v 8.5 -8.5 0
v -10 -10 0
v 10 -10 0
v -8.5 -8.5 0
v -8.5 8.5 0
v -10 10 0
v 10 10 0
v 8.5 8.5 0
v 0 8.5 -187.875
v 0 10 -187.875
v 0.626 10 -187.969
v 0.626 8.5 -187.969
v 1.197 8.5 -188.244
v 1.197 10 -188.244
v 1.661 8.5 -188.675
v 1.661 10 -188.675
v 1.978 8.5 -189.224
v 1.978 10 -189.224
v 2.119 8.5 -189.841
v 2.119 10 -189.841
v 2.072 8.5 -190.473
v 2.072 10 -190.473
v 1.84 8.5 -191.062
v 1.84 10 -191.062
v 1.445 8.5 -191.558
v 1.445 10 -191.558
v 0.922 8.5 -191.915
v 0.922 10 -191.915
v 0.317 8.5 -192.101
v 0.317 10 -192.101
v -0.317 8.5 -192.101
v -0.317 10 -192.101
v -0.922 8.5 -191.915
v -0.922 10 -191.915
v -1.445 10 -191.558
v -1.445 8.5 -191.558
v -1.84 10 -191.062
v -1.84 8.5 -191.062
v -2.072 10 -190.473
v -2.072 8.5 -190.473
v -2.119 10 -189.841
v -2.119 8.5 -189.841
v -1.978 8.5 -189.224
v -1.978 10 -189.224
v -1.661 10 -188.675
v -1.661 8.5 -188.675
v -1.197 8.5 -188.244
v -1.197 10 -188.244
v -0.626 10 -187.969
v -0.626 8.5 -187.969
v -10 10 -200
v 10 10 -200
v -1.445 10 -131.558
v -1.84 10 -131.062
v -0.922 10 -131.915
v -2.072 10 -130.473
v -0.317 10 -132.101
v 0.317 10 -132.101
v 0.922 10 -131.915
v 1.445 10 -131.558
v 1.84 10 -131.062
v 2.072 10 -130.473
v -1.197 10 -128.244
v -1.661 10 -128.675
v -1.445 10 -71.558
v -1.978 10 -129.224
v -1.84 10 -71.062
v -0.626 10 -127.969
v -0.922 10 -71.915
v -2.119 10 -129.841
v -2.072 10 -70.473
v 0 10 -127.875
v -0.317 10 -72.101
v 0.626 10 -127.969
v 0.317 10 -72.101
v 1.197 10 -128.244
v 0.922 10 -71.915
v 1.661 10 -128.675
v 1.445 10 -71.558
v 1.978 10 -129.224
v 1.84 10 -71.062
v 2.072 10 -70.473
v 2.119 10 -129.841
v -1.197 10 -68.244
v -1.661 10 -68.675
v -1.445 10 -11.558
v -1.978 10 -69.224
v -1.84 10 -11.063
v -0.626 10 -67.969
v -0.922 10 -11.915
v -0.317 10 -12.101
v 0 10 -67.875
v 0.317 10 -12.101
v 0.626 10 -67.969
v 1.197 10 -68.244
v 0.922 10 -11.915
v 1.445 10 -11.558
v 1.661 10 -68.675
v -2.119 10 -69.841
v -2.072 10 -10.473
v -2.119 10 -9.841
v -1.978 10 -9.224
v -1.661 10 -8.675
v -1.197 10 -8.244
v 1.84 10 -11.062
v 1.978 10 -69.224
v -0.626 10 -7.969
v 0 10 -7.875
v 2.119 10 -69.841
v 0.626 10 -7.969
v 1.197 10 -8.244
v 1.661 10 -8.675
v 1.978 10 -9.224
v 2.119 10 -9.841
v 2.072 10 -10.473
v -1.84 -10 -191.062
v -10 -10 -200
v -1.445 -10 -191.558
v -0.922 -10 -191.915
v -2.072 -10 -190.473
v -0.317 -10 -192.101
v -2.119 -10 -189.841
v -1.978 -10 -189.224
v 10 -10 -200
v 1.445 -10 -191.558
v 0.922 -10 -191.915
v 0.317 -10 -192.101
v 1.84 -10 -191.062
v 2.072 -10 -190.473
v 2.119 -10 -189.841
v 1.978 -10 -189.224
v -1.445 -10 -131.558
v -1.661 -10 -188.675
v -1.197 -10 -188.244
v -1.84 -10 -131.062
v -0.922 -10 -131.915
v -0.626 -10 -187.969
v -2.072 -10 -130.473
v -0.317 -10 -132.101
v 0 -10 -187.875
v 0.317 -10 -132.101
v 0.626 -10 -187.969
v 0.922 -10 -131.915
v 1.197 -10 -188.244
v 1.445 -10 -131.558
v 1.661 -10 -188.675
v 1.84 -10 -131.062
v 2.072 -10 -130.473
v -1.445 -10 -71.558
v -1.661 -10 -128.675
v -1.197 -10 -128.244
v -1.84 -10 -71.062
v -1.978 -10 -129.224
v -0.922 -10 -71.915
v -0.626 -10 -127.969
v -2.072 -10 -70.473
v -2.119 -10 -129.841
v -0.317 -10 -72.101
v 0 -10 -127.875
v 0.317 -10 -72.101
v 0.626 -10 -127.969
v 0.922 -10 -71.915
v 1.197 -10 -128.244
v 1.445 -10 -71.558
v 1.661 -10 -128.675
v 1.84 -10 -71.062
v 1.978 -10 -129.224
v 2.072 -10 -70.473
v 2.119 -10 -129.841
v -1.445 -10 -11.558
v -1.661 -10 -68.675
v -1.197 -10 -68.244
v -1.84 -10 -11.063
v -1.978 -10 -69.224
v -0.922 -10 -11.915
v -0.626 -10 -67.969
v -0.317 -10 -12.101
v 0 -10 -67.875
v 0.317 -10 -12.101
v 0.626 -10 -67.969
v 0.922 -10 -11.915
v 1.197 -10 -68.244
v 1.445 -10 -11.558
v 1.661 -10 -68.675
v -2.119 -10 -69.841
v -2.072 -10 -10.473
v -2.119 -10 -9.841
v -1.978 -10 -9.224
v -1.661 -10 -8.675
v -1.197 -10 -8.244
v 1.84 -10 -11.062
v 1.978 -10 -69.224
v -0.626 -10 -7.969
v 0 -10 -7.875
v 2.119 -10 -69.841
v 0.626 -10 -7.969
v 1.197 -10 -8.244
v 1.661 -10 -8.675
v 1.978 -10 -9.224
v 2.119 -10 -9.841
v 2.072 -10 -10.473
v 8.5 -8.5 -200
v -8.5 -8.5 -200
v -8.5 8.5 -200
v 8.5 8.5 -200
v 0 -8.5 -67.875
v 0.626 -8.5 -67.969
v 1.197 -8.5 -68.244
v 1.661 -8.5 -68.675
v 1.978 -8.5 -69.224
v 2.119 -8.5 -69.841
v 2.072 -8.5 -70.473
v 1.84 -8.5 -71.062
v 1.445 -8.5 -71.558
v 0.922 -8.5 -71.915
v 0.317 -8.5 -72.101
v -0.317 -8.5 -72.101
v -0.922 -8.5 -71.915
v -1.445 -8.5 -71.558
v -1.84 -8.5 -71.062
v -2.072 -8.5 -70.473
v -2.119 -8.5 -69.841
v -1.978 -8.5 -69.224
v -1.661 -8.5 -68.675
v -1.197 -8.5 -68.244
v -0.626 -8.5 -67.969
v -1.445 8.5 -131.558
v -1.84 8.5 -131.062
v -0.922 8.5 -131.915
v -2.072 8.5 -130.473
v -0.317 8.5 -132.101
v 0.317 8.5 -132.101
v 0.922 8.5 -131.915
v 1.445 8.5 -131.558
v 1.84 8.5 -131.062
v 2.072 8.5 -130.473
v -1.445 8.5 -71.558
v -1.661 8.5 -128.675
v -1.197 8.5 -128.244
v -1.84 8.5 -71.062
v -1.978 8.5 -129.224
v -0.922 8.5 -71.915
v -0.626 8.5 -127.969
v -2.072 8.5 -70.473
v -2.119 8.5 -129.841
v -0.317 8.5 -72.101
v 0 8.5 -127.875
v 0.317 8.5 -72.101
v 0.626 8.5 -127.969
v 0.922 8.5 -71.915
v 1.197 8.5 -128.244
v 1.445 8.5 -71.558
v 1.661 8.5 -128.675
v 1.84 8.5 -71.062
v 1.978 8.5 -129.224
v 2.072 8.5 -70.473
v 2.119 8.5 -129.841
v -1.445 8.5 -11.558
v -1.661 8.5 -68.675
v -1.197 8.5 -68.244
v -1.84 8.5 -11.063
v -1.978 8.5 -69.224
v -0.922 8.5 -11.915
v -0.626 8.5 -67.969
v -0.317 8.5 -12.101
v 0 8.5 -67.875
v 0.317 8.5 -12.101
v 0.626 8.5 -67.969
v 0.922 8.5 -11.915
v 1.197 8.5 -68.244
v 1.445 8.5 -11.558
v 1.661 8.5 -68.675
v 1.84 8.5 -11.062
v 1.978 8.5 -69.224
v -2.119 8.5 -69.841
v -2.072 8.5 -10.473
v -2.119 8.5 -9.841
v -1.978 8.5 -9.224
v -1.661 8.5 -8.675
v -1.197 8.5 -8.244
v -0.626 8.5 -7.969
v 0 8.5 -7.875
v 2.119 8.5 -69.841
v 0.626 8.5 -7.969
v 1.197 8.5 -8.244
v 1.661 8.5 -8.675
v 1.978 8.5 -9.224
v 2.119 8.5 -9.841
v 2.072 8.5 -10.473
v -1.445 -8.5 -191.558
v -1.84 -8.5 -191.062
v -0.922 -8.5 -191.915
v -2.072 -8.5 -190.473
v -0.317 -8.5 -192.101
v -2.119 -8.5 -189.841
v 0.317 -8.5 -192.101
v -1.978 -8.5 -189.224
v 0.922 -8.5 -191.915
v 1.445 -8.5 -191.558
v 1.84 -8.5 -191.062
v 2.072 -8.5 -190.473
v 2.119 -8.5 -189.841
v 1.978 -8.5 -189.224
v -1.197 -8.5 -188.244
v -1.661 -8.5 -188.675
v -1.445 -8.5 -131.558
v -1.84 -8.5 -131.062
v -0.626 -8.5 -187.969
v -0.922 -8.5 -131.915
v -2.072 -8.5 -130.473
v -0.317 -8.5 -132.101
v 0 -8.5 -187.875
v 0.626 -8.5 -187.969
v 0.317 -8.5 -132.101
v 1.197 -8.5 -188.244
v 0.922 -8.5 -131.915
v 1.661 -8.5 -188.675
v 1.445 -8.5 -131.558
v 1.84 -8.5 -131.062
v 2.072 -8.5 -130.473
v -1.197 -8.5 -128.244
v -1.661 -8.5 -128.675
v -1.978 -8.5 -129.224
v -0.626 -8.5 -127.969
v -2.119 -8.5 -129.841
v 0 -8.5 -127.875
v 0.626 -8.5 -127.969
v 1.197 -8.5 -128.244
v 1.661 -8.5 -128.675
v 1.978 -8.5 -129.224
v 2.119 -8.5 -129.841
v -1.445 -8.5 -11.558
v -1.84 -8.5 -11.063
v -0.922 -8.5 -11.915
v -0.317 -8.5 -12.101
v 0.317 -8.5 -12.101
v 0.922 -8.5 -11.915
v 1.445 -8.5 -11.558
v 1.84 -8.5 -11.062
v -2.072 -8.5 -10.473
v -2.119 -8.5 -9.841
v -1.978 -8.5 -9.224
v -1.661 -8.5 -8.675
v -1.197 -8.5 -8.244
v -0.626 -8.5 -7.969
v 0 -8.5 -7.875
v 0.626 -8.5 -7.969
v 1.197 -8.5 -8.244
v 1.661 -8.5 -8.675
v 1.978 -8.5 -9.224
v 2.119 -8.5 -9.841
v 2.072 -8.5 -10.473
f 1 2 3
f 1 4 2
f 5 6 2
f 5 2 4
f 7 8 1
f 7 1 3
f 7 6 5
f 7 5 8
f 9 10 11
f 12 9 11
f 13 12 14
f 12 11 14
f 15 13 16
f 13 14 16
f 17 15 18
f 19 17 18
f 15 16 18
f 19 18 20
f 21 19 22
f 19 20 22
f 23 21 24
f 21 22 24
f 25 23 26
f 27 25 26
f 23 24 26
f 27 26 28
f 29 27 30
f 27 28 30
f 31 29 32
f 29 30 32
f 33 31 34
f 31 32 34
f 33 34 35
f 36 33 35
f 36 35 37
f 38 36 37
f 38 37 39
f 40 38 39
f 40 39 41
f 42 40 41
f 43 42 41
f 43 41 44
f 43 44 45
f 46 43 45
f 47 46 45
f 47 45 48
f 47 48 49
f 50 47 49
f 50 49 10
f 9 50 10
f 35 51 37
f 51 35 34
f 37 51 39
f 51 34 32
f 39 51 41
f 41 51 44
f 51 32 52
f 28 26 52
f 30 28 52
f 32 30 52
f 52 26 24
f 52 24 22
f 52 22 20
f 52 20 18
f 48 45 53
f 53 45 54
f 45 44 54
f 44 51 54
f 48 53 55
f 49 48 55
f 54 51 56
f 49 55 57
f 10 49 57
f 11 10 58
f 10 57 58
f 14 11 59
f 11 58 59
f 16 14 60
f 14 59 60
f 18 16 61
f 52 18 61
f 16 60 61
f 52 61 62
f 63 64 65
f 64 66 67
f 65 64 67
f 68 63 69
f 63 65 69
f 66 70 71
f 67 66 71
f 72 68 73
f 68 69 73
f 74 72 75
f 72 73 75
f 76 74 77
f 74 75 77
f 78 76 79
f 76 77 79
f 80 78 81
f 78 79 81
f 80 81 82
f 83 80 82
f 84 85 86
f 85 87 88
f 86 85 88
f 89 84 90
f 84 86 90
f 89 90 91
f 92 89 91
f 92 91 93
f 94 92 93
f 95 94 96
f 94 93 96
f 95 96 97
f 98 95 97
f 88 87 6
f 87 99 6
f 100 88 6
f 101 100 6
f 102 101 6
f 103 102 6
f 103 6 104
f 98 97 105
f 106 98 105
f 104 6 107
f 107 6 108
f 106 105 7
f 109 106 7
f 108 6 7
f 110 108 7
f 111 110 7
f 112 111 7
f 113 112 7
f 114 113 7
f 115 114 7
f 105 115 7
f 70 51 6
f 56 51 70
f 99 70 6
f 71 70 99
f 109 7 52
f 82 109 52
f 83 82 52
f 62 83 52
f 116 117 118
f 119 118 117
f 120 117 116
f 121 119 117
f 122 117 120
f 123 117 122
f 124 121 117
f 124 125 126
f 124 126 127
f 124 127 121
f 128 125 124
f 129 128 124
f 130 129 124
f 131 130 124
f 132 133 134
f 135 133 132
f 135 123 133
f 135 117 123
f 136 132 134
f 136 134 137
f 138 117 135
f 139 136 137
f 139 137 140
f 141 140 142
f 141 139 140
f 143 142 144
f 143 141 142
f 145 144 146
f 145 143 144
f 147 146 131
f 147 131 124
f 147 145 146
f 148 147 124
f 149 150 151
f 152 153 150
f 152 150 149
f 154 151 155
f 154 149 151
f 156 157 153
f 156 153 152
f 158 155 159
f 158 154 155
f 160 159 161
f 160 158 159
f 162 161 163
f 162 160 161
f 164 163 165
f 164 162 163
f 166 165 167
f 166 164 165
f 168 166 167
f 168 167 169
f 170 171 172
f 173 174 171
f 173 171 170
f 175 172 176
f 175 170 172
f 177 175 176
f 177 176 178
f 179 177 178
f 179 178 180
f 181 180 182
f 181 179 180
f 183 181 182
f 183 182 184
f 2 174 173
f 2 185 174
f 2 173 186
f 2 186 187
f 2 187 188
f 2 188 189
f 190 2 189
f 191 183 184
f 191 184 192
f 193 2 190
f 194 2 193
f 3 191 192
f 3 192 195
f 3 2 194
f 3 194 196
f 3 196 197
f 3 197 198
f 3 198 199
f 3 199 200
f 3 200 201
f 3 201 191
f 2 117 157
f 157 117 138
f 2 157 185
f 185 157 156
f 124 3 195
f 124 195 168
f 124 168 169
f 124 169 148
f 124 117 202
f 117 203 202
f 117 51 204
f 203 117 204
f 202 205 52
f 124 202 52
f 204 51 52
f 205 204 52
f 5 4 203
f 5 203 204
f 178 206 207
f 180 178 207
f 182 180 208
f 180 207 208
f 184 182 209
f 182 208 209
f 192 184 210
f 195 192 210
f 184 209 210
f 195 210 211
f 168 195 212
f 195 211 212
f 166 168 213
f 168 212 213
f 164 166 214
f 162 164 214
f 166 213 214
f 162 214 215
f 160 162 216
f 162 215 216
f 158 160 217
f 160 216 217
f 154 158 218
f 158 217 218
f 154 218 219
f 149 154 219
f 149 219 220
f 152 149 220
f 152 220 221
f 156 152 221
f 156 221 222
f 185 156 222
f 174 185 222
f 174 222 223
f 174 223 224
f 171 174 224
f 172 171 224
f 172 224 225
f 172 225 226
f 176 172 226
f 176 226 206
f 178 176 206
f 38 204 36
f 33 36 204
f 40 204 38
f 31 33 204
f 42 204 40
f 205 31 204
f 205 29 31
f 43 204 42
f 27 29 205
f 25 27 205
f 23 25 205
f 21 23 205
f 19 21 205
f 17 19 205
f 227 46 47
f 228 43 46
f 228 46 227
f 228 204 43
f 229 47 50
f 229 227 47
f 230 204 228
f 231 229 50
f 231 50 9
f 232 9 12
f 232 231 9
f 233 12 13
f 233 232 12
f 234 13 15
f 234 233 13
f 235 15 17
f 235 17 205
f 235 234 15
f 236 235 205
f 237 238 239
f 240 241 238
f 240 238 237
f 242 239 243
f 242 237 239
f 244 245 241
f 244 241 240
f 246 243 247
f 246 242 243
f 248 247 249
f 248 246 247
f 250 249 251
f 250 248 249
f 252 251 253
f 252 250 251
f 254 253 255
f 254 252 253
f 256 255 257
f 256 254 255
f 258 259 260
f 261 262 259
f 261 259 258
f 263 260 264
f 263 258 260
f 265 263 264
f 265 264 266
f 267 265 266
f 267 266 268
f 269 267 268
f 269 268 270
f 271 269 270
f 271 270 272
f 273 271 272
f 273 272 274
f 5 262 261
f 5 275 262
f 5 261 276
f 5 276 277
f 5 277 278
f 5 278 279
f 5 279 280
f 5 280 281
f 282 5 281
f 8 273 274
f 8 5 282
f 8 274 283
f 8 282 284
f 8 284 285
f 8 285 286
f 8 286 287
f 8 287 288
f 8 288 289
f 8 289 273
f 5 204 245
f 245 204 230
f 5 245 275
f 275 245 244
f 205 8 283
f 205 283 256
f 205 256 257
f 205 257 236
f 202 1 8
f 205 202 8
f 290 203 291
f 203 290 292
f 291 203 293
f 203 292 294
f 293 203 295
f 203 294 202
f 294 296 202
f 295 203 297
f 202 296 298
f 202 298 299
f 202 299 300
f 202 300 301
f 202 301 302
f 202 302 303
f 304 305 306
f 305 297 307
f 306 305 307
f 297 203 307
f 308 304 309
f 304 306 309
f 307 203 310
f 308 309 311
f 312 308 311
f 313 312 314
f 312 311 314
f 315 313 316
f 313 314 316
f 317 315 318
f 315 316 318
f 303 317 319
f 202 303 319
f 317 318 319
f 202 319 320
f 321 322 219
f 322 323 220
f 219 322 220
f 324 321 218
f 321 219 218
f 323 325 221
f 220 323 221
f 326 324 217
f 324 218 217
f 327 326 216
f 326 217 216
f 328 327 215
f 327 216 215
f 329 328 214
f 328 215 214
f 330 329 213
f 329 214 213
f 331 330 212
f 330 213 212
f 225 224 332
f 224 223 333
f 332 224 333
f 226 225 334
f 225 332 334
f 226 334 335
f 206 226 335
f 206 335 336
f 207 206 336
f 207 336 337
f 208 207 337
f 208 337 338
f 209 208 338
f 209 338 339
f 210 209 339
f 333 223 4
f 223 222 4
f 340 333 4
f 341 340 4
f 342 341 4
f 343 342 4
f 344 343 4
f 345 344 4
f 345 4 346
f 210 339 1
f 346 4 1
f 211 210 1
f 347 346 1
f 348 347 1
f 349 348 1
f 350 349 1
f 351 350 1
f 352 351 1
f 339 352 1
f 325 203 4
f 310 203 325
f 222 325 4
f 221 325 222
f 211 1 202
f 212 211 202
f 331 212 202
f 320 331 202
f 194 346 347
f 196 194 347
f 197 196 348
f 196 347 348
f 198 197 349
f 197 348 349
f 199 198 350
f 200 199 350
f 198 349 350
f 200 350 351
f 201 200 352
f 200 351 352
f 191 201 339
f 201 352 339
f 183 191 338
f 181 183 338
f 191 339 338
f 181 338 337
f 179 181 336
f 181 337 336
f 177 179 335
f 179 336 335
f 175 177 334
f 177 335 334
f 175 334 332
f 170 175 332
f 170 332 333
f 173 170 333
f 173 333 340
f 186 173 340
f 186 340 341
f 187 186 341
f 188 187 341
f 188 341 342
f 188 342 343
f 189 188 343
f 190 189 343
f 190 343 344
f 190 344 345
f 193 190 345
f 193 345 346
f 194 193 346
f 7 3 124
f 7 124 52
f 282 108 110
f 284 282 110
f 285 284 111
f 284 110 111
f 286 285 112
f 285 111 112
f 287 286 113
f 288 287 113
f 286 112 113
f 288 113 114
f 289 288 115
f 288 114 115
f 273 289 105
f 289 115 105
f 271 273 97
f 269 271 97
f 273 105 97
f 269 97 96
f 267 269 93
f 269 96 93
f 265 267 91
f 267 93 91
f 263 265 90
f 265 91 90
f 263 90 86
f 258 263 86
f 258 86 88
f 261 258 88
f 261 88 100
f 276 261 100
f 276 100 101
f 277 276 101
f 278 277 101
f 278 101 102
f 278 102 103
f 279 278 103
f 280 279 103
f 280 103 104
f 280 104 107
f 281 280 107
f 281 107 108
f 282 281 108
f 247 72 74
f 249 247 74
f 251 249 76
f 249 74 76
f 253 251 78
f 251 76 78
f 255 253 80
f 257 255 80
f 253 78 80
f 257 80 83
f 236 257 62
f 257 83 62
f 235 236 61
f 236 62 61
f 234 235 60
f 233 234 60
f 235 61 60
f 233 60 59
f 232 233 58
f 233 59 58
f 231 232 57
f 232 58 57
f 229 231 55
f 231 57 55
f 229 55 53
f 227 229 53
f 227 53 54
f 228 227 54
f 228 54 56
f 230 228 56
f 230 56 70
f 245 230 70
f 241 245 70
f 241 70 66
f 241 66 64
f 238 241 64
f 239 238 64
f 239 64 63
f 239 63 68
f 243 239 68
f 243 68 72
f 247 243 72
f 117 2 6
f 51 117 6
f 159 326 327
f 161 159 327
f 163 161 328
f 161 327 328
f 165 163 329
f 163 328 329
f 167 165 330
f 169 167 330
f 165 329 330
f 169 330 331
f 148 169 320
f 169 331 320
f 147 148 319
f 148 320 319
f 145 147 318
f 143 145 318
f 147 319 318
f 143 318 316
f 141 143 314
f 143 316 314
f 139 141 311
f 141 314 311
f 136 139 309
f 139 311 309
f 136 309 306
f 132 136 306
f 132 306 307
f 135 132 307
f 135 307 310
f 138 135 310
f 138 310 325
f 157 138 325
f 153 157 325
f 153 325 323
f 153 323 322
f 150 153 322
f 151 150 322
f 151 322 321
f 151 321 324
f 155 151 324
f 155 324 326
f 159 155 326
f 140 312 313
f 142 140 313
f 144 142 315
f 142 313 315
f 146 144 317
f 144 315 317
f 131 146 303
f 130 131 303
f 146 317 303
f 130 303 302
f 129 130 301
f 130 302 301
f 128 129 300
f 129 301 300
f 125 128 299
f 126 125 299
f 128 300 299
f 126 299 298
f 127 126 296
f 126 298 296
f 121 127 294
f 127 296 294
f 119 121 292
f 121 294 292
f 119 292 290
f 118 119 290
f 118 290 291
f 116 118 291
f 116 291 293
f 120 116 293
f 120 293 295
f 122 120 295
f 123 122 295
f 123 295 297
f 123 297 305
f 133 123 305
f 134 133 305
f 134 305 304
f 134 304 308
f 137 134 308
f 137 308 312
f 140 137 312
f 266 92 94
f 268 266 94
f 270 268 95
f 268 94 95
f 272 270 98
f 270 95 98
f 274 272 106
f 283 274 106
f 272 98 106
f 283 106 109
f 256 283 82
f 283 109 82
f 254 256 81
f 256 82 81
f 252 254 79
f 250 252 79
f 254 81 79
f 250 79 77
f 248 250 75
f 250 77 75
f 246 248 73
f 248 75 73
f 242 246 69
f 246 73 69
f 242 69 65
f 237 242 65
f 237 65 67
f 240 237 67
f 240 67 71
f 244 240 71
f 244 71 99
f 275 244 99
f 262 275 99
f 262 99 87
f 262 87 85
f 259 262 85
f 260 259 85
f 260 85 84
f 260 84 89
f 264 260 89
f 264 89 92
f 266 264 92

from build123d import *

# Parameters (mm, degrees)
SKETCH1_W           = 20
SKETCH1_H           = 20
SKETCH1_W_2         = 17
SKETCH1_H_2         = 17
BOSS_EXTRUDE1_DEPTH = 200
SKETCH2_R           = 2.125
CUT_EXTRUDE1_DEPTH  = 202.246117975


with BuildPart() as part:
    # Sketch1 → Boss-Extrude1 (new body)
    with BuildSketch(Plane.XY):
        Rectangle(SKETCH1_W, SKETCH1_H)
        Rectangle(SKETCH1_W_2, SKETCH1_H_2, mode=Mode.SUBTRACT)
    extrude(amount=-BOSS_EXTRUDE1_DEPTH)

    # Sketch2 → Cut-Extrude1 (cut, through all)
    with BuildSketch(Plane(origin=(0, 10, 0), x_dir=(1, 0, 0), z_dir=(0, 1, 0))):
        with Locations(Location((0, 10, 0), (0, 0, 270))):
            Circle(SKETCH2_R)
        with Locations(Location((0, 70, 0), (0, 0, 270))):
            Circle(SKETCH2_R)
        with Locations(Location((0, 130, 0), (0, 0, 270))):
            Circle(SKETCH2_R)
        with Locations(Location((0, 190, 0), (0, 0, 270))):
            Circle(SKETCH2_R)
    extrude(amount=-CUT_EXTRUDE1_DEPTH, mode=Mode.SUBTRACT)


solid = part.part
